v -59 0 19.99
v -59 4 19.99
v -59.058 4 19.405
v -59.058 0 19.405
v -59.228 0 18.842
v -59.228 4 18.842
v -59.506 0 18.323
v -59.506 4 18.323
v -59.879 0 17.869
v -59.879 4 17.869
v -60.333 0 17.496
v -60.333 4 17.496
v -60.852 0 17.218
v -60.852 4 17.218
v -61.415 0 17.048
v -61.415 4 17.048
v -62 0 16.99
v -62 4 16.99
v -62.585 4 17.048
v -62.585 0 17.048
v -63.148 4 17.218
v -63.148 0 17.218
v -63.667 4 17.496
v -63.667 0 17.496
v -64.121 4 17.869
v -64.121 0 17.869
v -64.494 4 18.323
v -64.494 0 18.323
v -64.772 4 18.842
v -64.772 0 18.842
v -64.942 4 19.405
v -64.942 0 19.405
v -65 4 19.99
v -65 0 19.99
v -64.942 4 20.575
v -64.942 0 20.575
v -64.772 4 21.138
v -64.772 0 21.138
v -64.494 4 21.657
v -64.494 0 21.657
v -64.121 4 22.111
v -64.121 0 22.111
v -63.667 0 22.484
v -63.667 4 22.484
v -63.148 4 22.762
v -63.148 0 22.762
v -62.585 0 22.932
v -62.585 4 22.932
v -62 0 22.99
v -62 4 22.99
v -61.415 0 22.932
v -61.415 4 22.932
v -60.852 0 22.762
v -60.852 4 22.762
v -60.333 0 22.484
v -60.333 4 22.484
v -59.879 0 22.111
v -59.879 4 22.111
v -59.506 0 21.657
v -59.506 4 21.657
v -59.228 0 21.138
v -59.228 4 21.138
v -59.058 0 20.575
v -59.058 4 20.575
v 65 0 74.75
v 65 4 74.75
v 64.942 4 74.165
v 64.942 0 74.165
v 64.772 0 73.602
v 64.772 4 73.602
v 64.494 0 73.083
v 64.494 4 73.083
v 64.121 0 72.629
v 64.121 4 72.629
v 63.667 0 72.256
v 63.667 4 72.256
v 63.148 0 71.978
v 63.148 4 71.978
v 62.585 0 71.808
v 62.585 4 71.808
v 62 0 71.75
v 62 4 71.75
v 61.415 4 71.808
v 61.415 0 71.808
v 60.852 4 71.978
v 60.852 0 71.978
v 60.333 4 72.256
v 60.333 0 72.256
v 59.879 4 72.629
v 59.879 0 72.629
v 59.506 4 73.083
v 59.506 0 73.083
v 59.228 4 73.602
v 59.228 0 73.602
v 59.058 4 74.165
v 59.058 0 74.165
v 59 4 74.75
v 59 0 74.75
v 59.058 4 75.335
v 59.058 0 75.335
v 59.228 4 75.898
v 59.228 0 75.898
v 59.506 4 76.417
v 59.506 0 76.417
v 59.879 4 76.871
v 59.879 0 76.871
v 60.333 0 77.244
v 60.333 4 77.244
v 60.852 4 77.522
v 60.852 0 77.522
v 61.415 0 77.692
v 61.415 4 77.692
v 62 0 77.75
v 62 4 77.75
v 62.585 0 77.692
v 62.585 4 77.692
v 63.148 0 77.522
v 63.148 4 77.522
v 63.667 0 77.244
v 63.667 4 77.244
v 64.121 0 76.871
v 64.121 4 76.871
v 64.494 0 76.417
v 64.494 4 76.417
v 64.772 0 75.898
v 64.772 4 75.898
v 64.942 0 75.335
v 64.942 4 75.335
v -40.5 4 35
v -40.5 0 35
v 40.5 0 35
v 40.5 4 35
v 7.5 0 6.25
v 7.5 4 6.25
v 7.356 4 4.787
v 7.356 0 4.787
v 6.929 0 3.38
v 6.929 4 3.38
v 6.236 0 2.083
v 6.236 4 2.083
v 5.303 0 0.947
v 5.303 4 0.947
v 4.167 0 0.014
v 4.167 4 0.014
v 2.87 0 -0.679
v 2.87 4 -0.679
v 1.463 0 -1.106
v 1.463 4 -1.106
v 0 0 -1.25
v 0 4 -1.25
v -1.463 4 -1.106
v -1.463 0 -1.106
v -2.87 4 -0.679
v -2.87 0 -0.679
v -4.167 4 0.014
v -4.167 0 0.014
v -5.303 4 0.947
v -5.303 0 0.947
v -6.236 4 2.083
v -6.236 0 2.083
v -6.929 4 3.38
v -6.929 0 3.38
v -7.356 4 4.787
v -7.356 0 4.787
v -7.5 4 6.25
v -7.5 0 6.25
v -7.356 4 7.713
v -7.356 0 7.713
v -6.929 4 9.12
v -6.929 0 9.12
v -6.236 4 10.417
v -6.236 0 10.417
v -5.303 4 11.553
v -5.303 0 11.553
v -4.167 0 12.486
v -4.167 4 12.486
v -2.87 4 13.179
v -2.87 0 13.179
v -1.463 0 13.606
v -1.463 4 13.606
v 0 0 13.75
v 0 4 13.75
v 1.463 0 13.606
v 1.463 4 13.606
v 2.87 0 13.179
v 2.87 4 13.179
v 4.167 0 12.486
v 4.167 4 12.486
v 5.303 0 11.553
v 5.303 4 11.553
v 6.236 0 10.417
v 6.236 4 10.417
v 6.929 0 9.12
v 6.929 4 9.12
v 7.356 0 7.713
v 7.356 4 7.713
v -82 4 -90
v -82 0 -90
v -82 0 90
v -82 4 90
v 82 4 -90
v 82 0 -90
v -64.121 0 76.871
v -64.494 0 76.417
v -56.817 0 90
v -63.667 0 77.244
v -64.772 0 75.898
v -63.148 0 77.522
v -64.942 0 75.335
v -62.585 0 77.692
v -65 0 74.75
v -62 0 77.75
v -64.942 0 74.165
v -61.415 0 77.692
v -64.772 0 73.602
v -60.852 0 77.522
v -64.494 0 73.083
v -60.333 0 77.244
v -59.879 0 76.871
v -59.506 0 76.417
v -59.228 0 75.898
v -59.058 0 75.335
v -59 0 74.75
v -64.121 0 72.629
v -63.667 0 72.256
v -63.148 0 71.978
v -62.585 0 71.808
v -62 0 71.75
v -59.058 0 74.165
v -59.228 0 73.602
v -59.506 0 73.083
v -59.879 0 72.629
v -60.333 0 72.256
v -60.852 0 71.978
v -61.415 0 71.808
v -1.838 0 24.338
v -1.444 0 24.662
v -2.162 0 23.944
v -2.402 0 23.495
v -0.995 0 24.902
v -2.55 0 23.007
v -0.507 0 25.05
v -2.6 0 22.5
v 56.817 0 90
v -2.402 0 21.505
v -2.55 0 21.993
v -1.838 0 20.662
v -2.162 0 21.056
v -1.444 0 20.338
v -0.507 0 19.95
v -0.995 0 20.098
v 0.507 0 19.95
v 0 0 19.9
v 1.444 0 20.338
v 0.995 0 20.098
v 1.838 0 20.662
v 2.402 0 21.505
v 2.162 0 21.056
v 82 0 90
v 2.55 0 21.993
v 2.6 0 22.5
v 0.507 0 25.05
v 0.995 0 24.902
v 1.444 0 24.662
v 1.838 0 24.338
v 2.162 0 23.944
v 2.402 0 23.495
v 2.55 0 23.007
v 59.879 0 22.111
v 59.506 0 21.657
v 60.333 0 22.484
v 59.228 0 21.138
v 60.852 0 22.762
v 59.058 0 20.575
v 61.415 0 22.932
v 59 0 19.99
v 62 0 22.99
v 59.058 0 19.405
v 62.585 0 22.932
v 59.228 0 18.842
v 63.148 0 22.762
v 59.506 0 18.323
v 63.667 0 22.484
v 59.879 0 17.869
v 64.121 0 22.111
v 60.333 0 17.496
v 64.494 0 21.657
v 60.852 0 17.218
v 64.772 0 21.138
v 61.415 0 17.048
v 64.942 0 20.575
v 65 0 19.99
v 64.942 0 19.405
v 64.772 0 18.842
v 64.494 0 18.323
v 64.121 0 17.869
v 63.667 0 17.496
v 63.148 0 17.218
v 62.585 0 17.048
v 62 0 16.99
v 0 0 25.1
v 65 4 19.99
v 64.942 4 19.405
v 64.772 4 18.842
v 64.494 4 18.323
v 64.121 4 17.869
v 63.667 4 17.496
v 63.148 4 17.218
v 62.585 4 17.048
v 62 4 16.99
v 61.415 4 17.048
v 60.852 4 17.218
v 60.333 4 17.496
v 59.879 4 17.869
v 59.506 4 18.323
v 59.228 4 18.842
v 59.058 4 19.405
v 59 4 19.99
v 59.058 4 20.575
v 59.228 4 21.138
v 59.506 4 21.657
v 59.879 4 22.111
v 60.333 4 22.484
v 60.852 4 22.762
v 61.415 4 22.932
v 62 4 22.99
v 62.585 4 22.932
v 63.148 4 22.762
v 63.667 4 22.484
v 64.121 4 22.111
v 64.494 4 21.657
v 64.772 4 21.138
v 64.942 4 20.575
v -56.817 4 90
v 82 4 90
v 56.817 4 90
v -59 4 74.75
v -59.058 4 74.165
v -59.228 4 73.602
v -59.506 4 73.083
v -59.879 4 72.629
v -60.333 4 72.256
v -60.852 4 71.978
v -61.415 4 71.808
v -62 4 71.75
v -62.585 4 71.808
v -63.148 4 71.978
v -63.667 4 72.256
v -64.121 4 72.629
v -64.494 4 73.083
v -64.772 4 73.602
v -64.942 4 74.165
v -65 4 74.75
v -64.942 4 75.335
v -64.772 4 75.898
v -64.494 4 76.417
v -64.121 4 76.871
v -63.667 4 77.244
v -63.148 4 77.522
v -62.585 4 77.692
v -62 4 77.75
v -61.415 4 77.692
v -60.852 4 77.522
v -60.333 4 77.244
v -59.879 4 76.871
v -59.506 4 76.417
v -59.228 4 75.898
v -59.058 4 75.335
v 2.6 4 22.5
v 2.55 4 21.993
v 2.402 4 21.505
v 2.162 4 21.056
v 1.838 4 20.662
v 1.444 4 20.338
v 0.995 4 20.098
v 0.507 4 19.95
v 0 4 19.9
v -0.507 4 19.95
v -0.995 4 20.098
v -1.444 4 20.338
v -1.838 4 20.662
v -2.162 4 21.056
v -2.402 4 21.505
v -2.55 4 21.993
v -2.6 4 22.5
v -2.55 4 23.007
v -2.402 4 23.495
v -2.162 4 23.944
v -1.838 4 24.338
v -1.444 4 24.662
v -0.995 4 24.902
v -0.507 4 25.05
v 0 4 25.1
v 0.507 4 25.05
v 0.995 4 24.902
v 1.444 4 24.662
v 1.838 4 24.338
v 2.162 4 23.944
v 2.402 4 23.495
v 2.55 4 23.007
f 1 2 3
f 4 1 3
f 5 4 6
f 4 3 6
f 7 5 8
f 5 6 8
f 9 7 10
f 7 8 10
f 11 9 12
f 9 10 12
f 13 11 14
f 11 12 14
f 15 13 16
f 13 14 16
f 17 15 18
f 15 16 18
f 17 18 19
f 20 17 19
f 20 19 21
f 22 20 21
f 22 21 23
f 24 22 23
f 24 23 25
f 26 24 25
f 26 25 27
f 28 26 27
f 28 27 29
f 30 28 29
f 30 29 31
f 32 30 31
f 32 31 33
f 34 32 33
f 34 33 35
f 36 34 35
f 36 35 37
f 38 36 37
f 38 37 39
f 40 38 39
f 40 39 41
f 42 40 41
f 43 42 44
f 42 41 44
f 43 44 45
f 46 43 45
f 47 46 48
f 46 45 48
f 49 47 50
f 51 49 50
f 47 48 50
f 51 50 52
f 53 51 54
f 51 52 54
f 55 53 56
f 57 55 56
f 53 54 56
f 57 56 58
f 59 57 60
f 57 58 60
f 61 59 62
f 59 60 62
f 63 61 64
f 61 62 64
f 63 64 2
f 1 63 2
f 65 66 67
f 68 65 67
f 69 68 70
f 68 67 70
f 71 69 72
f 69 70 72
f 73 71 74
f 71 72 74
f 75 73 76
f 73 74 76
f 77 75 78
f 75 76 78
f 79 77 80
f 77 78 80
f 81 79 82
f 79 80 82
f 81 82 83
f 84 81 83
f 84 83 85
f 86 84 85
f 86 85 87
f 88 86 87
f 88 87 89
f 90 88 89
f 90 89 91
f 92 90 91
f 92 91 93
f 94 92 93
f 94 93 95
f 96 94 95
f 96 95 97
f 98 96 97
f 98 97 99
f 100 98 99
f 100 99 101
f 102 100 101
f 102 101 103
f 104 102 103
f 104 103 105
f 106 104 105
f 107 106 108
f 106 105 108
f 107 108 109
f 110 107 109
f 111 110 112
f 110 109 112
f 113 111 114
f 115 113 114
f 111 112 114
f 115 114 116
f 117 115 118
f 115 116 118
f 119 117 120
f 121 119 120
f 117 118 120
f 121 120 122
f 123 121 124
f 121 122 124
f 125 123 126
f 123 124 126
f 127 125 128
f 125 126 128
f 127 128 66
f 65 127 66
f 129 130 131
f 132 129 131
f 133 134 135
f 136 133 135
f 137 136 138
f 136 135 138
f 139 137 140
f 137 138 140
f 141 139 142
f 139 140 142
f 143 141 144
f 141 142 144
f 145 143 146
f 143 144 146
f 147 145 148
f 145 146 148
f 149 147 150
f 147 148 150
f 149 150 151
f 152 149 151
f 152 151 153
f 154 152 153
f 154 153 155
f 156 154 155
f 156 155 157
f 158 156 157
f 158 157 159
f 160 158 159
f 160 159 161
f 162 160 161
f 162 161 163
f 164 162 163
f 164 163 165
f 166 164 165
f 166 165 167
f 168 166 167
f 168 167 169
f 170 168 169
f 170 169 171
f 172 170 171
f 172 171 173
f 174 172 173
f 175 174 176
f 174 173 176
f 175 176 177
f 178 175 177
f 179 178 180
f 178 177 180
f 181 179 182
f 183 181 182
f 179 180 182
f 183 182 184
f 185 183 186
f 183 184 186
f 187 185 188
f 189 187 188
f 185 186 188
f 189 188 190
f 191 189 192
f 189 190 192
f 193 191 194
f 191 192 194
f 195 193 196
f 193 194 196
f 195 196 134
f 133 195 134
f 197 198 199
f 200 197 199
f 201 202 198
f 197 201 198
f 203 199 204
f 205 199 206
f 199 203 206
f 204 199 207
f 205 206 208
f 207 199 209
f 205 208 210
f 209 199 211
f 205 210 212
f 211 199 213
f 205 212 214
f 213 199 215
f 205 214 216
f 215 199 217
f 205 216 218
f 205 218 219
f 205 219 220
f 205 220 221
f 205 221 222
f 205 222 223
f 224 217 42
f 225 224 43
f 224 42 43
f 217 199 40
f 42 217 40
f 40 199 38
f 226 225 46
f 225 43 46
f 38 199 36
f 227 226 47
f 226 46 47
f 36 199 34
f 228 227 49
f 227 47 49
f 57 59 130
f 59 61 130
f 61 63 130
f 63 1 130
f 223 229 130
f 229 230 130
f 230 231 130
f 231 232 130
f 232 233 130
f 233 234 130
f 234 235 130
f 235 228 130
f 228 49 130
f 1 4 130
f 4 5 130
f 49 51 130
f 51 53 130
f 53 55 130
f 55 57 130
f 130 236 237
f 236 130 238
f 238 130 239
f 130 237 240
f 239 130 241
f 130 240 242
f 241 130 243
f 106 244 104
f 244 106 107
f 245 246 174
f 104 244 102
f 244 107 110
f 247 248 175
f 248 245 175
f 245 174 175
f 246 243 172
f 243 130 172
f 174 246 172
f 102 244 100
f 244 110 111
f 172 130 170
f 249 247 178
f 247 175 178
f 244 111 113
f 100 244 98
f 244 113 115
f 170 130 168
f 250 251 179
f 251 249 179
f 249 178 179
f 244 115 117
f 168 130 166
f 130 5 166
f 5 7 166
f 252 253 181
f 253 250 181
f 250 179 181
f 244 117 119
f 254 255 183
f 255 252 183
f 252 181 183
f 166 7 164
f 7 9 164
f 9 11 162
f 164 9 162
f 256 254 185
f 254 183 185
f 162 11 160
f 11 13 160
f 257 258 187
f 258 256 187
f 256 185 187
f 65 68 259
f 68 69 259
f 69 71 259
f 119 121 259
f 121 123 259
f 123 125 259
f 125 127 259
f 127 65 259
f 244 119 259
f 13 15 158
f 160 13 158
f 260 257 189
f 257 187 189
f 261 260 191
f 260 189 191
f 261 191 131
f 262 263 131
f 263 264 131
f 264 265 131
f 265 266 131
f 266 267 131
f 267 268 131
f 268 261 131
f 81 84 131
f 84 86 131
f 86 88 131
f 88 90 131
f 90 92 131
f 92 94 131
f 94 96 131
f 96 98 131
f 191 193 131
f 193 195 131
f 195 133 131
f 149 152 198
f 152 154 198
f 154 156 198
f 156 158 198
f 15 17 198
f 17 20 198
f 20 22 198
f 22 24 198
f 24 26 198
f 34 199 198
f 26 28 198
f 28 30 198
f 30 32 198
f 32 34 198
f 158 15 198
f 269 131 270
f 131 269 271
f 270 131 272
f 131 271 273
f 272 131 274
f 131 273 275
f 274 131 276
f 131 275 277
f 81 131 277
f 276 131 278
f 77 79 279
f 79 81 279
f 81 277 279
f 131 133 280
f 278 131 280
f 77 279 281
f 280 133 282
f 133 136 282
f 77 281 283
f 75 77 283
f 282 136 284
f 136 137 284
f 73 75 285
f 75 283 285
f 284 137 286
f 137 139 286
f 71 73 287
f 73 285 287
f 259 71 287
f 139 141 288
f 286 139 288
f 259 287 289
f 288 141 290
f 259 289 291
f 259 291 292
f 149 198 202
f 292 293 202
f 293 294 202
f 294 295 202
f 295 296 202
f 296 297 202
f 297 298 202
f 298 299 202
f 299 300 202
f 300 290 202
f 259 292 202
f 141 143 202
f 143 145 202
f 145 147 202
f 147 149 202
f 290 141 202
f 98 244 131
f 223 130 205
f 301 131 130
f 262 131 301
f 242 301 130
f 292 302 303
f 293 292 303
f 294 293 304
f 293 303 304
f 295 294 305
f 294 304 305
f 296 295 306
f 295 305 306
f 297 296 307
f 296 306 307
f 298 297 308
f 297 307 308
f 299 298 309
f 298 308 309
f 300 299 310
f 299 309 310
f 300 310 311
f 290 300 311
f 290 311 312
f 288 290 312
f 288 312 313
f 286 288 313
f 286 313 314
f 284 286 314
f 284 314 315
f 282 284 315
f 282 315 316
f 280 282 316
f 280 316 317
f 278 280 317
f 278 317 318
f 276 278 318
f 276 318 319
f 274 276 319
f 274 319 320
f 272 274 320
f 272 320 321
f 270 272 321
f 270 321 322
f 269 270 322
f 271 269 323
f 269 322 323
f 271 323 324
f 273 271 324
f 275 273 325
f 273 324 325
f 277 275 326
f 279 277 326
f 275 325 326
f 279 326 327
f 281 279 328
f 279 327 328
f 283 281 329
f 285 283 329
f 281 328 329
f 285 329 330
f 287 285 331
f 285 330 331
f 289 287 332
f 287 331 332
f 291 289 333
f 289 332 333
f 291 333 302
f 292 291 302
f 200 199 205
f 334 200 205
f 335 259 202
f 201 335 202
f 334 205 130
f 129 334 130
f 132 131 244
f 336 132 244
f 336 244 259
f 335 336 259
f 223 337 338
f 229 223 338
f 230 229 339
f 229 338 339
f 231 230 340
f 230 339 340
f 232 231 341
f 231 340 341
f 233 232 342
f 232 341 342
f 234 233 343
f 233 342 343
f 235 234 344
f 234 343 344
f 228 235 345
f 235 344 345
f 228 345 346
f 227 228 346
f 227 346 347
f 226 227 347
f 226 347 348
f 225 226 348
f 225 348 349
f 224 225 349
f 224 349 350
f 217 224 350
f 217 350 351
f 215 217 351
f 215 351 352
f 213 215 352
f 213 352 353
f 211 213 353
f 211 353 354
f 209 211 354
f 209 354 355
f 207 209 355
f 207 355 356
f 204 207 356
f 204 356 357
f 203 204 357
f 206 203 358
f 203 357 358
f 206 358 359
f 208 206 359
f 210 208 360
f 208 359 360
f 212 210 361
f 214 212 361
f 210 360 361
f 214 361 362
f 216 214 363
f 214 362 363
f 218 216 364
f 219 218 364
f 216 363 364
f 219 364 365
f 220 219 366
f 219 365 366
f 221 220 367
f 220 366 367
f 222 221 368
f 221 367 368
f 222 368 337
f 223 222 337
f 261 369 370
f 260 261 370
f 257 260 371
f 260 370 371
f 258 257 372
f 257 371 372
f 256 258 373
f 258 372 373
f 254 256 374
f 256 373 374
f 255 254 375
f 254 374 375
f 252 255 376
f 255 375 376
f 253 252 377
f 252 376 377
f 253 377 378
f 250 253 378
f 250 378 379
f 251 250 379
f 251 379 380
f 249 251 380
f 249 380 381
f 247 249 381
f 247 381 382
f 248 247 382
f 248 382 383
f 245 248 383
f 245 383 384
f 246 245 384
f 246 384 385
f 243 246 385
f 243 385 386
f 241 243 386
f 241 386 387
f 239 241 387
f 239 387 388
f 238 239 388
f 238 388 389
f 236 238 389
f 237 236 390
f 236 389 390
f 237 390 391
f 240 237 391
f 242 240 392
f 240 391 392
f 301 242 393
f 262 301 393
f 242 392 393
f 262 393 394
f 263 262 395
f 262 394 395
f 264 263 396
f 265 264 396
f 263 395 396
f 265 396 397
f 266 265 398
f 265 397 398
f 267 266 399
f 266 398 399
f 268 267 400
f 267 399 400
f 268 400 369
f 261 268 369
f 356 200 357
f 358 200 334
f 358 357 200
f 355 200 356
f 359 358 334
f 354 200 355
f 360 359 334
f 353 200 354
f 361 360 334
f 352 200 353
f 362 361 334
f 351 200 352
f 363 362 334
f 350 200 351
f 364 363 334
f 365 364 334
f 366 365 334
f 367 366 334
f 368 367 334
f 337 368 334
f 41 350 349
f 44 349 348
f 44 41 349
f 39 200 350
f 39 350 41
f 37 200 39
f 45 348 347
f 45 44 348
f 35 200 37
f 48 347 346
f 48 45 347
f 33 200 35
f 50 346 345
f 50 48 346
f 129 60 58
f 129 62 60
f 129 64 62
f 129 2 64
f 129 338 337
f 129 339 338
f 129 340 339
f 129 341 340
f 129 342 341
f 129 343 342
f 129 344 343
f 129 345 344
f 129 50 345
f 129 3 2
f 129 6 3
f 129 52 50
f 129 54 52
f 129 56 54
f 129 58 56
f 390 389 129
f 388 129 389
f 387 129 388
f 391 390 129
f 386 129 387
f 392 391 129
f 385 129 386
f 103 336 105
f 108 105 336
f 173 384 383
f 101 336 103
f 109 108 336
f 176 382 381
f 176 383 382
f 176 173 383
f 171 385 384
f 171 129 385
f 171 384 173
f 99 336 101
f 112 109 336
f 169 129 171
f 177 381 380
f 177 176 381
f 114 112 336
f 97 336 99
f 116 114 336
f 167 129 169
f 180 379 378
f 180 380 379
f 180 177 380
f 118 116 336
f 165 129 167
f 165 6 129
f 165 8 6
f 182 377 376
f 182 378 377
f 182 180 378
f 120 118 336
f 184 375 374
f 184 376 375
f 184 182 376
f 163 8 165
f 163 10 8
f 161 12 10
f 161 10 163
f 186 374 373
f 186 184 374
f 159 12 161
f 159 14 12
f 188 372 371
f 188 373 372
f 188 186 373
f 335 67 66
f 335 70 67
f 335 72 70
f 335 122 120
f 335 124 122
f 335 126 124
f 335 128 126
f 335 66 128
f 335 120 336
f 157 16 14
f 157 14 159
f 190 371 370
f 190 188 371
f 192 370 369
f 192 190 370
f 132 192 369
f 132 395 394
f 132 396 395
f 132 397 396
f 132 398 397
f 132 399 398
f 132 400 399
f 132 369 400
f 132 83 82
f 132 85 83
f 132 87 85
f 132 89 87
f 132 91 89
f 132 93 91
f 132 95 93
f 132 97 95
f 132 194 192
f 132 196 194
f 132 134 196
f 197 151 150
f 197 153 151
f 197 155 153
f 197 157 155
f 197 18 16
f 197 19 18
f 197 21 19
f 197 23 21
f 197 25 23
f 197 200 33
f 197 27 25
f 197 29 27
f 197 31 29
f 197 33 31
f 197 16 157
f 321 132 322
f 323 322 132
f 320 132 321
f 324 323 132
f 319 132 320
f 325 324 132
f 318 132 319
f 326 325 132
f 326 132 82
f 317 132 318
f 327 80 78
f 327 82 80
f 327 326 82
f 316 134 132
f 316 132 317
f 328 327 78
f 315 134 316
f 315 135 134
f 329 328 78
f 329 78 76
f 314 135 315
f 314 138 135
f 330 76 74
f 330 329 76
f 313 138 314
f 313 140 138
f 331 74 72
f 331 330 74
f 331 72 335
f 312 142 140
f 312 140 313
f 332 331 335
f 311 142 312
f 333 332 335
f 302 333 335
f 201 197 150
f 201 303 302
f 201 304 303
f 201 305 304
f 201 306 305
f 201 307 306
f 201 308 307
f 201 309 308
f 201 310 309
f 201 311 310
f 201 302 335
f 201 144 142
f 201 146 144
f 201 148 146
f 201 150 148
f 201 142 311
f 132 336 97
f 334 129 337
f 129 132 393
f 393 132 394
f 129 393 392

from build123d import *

# Parameters (mm, degrees)
BOSS_EXTRUDE3_DEPTH = 4
CUT_EXTRUDE3_REACH  = 6
SKETCH5_R           = 3
SKETCH5_R_2         = 7.5
SKETCH5_R_3         = 2.6


with BuildPart() as part:
    # Sketch1 → Boss-Extrude3 (new body)
    with BuildSketch(Plane(origin=(0, 0, 0), x_dir=(1, 0, 0), z_dir=(0, 1, 0))):
        Polygon((40.5, -35), (56.816666667, -90), (82, -90), (82, 90), (-82, 90), (-82, -90), (-56.816666667, -90), (-40.5, -35), align=None)
    extrude(amount=BOSS_EXTRUDE3_DEPTH)

    # Sketch5 → Cut-Extrude3 (cut, up to next)
    with BuildSketch(Plane(origin=(0, 4, 0), x_dir=(1, 0, 0), z_dir=(0, 1, 0)), mode=Mode.PRIVATE) as cut_extrude3_sk1:
        with Locations((62, -74.75)):
            Circle(SKETCH5_R)
    cut_extrude3_tool1 = extrude(cut_extrude3_sk1.sketch, amount=-CUT_EXTRUDE3_REACH, mode=Mode.PRIVATE) & part.part
    add(cut_extrude3_tool1.solids().sort_by_distance((62, 4, 74.75))[0], mode=Mode.SUBTRACT)
    # Sketch5 → Cut-Extrude3 (cut, up to next)
    with BuildSketch(Plane(origin=(0, 4, 0), x_dir=(1, 0, 0), z_dir=(0, 1, 0)), mode=Mode.PRIVATE) as cut_extrude3_sk2:
        with Locations((62, -19.99)):
            Circle(SKETCH5_R)
    cut_extrude3_tool2 = extrude(cut_extrude3_sk2.sketch, amount=-CUT_EXTRUDE3_REACH, mode=Mode.PRIVATE) & part.part
    add(cut_extrude3_tool2.solids().sort_by_distance((62, 4, 19.99))[0], mode=Mode.SUBTRACT)
    # Sketch5 → Cut-Extrude3 (cut, up to next)
    with BuildSketch(Plane(origin=(0, 4, 0), x_dir=(1, 0, 0), z_dir=(0, 1, 0)), mode=Mode.PRIVATE) as cut_extrude3_sk3:
        with Locations((-62, -74.75)):
            Circle(SKETCH5_R)
    cut_extrude3_tool3 = extrude(cut_extrude3_sk3.sketch, amount=-CUT_EXTRUDE3_REACH, mode=Mode.PRIVATE) & part.part
    add(cut_extrude3_tool3.solids().sort_by_distance((-62, 4, 74.75))[0], mode=Mode.SUBTRACT)
    # Sketch5 → Cut-Extrude3 (cut, up to next)
    with BuildSketch(Plane(origin=(0, 4, 0), x_dir=(1, 0, 0), z_dir=(0, 1, 0)), mode=Mode.PRIVATE) as cut_extrude3_sk4:
        with Locations((-62, -19.99)):
            Circle(SKETCH5_R)
    cut_extrude3_tool4 = extrude(cut_extrude3_sk4.sketch, amount=-CUT_EXTRUDE3_REACH, mode=Mode.PRIVATE) & part.part
    add(cut_extrude3_tool4.solids().sort_by_distance((-62, 4, 19.99))[0], mode=Mode.SUBTRACT)
    # Sketch5 → Cut-Extrude3 (cut, up to next)
    with BuildSketch(Plane(origin=(0, 4, 0), x_dir=(1, 0, 0), z_dir=(0, 1, 0)), mode=Mode.PRIVATE) as cut_extrude3_sk5:
        with Locations((0, -6.25)):
            Circle(SKETCH5_R_2)
    cut_extrude3_tool5 = extrude(cut_extrude3_sk5.sketch, amount=-CUT_EXTRUDE3_REACH, mode=Mode.PRIVATE) & part.part
    add(cut_extrude3_tool5.solids().sort_by_distance((0, 4, 6.25))[0], mode=Mode.SUBTRACT)
    # Sketch5 → Cut-Extrude3 (cut, up to next)
    with BuildSketch(Plane(origin=(0, 4, 0), x_dir=(1, 0, 0), z_dir=(0, 1, 0)), mode=Mode.PRIVATE) as cut_extrude3_sk6:
        with Locations((0, -22.5)):
            Circle(SKETCH5_R_3)
    cut_extrude3_tool6 = extrude(cut_extrude3_sk6.sketch, amount=-CUT_EXTRUDE3_REACH, mode=Mode.PRIVATE) & part.part
    add(cut_extrude3_tool6.solids().sort_by_distance((0, 4, 22.5))[0], mode=Mode.SUBTRACT)


solid = part.part
